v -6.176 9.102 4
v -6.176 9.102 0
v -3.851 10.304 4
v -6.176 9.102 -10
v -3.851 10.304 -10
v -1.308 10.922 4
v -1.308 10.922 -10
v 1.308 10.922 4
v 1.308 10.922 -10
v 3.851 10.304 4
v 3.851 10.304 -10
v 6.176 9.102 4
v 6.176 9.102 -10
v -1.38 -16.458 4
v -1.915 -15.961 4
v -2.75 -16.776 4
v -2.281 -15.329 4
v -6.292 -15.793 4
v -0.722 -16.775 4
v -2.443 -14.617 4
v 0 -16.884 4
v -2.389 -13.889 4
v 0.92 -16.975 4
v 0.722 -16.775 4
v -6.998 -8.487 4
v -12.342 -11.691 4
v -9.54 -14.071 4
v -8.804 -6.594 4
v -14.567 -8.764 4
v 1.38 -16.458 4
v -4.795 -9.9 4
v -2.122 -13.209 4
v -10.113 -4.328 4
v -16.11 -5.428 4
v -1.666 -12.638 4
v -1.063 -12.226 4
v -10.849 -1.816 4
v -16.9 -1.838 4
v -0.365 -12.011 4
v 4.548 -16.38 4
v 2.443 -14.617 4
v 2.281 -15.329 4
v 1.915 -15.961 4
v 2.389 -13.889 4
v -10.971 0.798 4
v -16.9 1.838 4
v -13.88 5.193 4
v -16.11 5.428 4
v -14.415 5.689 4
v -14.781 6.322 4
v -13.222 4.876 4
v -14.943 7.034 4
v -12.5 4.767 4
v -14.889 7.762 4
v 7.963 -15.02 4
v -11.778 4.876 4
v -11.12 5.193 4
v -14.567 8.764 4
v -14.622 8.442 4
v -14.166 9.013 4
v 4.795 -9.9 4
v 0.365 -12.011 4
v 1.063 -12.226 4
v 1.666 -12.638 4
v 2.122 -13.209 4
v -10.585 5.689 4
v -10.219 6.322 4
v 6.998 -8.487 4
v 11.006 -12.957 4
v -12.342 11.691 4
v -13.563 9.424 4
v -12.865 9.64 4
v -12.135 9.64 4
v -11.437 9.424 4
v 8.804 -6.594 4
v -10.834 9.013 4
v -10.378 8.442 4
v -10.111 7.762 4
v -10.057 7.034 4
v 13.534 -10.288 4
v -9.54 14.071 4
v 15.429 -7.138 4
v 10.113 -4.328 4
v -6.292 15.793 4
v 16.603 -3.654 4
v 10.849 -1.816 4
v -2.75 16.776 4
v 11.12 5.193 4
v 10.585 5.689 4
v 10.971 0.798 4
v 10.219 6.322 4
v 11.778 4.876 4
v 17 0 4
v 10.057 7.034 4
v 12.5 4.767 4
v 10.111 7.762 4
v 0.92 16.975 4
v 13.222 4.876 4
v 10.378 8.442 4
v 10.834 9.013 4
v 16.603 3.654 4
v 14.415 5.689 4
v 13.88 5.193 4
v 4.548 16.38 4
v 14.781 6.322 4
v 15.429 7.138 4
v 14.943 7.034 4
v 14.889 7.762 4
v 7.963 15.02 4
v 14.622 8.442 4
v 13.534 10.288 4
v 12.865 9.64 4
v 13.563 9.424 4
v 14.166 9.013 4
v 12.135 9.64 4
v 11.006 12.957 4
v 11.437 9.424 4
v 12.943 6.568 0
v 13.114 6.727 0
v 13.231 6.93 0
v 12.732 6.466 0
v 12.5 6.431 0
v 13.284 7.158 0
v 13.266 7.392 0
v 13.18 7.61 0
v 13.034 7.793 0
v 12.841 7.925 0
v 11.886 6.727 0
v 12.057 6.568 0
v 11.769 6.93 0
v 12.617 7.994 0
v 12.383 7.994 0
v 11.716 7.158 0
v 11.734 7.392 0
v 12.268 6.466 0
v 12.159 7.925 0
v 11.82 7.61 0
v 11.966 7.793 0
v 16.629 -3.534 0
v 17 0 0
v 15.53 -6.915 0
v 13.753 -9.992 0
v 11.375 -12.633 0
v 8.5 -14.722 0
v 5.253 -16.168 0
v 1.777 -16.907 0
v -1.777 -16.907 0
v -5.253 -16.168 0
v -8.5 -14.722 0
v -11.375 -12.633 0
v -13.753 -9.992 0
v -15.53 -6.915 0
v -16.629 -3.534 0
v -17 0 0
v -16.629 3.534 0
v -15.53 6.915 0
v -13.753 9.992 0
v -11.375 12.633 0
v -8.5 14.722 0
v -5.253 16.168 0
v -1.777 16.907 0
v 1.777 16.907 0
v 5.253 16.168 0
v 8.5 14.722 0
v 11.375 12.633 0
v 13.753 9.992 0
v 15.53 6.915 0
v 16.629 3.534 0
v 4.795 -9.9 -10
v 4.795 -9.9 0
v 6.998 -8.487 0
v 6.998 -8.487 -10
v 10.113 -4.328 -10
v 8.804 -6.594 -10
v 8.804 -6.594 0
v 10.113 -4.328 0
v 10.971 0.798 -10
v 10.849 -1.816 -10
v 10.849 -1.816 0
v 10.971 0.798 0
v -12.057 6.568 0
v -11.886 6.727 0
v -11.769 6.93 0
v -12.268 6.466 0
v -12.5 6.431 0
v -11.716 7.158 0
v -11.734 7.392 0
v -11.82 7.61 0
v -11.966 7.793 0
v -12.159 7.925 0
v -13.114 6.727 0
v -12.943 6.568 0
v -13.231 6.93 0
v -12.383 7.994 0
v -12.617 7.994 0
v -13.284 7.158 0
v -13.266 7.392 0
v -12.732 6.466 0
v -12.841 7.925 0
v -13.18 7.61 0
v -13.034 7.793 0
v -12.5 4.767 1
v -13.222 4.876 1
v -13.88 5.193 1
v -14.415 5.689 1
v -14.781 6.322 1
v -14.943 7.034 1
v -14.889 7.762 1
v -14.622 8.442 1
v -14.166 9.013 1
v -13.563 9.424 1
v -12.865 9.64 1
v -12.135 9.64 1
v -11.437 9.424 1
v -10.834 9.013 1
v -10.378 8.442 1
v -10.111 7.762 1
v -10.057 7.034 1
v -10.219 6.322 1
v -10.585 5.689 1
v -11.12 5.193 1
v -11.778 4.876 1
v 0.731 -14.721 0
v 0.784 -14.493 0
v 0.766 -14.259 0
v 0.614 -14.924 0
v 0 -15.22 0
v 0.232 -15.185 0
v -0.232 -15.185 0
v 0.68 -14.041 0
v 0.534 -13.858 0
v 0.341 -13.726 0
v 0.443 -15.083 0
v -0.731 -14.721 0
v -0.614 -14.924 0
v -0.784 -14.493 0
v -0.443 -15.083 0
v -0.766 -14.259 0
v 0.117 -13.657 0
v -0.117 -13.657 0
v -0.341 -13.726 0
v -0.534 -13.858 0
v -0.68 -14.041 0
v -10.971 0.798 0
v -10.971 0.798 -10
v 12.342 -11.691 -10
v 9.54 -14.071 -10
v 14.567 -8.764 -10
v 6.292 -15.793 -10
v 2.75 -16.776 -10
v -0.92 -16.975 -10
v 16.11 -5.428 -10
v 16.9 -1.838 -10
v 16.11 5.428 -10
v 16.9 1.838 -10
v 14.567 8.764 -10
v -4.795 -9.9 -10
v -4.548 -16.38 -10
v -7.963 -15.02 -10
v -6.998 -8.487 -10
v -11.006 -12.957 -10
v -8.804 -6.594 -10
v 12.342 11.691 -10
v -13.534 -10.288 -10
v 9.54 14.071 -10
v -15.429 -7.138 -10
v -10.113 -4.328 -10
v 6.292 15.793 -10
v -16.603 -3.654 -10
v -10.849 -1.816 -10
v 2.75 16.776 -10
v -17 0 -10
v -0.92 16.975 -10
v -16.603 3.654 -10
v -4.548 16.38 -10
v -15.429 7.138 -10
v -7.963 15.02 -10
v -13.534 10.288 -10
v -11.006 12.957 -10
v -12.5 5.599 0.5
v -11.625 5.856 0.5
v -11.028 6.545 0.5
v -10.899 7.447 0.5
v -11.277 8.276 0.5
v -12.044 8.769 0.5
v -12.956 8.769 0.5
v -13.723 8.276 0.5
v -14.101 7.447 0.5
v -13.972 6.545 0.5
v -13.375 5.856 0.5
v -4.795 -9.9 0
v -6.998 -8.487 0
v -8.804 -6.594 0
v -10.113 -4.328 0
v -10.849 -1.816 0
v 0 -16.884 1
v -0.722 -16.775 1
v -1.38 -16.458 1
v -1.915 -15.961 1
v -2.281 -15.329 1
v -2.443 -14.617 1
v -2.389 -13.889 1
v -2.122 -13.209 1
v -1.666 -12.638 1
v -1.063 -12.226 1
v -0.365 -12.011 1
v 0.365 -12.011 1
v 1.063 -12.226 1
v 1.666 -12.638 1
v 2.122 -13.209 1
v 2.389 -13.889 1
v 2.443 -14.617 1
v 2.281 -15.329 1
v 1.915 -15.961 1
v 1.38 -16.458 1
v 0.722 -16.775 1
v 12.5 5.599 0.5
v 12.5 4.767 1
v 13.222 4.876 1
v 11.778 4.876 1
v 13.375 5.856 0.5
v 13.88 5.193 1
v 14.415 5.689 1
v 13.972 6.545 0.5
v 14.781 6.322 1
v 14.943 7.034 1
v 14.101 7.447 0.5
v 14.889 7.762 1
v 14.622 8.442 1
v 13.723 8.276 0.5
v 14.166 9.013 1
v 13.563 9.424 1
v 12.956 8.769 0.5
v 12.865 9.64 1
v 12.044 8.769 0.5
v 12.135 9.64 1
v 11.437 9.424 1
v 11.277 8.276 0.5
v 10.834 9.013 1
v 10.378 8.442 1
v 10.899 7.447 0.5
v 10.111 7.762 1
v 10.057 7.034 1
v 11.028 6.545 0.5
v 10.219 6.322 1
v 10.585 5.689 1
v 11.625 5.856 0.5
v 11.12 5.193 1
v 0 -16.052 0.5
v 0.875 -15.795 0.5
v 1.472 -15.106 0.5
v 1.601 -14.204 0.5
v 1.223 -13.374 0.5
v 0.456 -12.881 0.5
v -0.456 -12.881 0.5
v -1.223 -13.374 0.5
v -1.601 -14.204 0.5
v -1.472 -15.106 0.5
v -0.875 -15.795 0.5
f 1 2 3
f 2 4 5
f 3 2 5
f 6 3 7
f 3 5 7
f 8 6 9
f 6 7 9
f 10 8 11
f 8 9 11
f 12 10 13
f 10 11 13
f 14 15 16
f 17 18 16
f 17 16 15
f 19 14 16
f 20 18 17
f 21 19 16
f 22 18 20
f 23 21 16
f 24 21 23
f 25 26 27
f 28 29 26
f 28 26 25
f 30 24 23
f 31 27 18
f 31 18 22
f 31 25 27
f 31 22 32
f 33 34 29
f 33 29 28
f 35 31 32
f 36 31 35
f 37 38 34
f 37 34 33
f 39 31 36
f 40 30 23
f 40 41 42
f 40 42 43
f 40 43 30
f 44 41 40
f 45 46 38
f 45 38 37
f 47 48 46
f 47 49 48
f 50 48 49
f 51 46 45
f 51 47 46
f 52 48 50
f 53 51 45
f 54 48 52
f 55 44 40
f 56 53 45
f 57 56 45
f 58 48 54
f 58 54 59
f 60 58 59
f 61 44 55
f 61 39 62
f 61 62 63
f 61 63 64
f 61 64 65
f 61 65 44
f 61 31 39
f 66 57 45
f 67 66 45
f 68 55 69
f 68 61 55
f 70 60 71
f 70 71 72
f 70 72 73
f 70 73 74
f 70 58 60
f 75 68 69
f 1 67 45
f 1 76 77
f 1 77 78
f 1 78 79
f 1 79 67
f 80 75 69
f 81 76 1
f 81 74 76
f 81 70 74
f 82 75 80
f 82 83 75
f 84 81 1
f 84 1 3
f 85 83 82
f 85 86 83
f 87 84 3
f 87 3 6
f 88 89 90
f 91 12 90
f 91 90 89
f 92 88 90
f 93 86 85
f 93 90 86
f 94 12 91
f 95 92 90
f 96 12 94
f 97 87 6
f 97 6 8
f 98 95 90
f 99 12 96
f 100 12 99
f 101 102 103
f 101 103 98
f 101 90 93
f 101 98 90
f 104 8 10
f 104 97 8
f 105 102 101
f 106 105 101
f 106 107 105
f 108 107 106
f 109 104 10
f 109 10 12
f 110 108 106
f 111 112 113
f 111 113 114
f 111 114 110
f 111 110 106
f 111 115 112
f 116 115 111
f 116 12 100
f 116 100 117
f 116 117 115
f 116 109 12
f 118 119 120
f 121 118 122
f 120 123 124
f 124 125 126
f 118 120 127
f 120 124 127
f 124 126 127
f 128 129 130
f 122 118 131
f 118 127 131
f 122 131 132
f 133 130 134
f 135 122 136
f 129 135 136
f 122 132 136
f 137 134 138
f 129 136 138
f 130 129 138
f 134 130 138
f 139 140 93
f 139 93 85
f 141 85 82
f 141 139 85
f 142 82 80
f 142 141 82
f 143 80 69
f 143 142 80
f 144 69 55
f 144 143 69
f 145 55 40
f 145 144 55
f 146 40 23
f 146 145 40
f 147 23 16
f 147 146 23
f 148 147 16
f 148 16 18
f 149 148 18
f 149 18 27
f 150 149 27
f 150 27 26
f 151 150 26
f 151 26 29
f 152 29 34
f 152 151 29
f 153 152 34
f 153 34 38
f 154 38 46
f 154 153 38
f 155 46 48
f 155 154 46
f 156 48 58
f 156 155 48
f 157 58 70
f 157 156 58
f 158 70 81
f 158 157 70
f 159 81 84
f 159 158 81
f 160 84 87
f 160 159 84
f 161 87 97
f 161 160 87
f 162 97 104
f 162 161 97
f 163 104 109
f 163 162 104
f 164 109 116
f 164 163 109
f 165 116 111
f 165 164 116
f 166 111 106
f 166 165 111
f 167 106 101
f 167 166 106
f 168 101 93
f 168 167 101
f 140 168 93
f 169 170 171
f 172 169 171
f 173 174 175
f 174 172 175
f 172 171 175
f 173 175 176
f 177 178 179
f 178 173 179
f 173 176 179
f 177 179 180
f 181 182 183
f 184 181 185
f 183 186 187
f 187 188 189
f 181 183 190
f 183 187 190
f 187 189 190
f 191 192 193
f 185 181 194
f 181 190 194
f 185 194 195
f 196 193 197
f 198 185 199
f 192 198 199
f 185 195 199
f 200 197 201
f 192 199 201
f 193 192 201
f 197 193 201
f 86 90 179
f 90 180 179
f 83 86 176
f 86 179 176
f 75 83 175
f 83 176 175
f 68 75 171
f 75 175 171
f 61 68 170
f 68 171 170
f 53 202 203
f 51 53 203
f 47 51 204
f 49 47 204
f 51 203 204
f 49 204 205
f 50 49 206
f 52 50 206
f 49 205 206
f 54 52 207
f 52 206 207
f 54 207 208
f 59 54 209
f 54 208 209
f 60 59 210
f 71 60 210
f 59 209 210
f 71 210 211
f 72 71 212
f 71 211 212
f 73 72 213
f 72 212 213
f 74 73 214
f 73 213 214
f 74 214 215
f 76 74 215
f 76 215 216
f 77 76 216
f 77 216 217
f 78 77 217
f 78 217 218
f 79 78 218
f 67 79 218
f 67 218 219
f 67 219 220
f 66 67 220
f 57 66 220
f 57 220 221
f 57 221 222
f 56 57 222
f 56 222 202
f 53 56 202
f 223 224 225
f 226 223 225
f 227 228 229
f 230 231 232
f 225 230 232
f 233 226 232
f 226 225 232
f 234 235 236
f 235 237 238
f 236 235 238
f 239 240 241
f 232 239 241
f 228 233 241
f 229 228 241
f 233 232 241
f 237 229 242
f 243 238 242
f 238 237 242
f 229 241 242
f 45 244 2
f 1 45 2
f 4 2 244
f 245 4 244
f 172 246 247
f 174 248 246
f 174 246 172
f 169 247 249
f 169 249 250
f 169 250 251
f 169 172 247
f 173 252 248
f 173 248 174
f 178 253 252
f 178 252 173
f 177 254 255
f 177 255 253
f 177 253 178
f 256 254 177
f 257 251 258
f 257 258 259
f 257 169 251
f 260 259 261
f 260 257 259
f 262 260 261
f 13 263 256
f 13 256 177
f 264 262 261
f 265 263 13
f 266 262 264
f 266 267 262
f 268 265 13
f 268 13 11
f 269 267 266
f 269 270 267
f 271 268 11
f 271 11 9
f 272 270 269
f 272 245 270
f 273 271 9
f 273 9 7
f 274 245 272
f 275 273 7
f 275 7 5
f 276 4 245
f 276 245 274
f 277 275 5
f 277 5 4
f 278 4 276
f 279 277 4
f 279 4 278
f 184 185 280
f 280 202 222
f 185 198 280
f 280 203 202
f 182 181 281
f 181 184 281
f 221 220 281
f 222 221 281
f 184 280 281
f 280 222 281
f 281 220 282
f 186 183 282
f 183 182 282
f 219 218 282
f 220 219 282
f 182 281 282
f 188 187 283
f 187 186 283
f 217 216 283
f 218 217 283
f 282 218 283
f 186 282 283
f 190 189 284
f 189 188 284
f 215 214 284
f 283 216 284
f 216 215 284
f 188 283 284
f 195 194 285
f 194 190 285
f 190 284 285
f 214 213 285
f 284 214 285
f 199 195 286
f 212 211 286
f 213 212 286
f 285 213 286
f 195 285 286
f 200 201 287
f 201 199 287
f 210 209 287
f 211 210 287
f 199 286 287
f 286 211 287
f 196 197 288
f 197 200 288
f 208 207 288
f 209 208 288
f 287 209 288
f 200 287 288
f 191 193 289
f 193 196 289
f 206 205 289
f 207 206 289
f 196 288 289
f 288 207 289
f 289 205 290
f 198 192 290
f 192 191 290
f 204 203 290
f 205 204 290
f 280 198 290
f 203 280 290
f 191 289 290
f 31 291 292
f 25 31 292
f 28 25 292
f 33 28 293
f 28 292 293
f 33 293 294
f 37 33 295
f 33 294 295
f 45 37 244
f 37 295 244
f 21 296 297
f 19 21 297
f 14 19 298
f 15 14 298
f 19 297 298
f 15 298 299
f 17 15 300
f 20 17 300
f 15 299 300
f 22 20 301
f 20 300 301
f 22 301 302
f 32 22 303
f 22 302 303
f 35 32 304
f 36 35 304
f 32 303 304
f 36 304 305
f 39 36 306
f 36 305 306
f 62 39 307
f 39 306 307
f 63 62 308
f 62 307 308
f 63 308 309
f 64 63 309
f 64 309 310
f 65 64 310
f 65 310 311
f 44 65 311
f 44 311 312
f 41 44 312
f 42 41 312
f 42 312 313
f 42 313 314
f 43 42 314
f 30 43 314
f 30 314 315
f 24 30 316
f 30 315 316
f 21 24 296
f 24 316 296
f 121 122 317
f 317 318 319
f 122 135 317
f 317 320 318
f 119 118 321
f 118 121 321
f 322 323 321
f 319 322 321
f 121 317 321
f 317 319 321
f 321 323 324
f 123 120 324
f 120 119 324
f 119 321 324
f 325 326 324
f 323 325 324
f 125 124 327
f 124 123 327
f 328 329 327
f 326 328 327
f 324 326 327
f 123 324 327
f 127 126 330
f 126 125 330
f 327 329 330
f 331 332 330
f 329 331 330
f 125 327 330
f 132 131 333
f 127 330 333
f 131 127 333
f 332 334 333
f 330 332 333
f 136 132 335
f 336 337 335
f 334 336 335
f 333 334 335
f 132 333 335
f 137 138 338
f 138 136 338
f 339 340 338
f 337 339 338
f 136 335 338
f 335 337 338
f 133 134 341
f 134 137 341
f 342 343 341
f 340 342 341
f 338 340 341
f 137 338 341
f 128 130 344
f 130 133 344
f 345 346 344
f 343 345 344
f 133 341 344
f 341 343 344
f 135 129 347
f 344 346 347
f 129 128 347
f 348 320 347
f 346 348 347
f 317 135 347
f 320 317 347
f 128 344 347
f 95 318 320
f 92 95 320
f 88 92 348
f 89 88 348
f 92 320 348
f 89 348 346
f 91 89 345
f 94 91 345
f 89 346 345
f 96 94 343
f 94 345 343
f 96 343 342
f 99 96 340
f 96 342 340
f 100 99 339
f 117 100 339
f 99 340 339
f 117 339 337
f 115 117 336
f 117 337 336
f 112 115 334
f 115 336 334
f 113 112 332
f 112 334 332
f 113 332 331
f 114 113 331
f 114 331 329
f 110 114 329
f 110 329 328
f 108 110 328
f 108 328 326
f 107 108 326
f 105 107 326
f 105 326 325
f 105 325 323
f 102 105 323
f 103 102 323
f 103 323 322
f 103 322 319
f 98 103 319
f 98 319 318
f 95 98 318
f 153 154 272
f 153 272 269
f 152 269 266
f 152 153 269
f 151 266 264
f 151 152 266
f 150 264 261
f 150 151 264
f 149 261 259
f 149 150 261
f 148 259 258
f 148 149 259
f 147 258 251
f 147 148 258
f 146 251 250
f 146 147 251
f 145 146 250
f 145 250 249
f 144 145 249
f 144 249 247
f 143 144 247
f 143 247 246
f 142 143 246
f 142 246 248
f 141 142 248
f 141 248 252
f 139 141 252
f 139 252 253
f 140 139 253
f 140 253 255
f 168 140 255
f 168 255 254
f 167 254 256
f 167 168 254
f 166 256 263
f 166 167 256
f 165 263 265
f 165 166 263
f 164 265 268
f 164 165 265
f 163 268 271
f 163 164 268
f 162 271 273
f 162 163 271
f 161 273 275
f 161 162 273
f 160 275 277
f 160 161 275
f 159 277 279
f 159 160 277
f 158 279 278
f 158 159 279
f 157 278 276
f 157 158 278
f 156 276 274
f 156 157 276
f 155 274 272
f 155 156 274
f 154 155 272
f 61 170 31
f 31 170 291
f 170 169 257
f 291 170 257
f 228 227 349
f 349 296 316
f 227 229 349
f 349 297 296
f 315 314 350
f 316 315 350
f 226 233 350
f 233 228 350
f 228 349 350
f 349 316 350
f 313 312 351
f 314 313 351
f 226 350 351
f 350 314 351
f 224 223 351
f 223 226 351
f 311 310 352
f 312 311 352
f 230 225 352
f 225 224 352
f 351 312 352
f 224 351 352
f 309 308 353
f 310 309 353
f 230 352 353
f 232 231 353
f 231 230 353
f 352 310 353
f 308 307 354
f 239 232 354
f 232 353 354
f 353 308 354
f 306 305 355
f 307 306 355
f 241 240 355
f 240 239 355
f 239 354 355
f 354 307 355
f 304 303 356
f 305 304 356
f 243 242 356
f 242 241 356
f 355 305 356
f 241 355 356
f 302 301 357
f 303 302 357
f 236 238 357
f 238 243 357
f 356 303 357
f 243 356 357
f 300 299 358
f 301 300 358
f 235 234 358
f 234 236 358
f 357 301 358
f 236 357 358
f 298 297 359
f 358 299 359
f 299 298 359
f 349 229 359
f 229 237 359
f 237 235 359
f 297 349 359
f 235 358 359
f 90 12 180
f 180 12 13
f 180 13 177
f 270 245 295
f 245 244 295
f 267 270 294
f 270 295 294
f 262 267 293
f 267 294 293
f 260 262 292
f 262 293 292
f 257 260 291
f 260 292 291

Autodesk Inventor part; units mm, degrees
ref_plane "YZ Plane" through (0, 0, 0) normal (1, 0, 0) x (0, 1, 0)
ref_plane "XZ Plane" through (0, 0, 0) normal (0, 1, 0) x (-1, 0, 0)
ref_plane "XY Plane" through (0, 0, 0) normal (0, 0, 1) x (1, 0, 0)
sketch "Sketch1" plane through (0, 0, 0) normal (0, 0, 1) x (1, 0, 0)
  circle A0 centre (0, 0) radius 17
  line L0 (4.7948, -9.9) -> (-4.7948, -9.9)
  line L1 (-23.8, 0) -> (23.8, 0) projected
  line L2 (6.1763, 9.1024) -> (10.971, 0.7976)
  line L3 (-10.971, 0.7976) -> (-6.1763, 9.1024)
  arc A1 (4.7948, -9.9) -> (10.971, 0.7976) centre (0, 0) ccw
  arc A2 (6.1763, 9.1024) -> (-6.1763, 9.1024) centre (0, 0) ccw
  arc A3 (-10.971, 0.7976) -> (-4.7948, -9.9) centre (0, 0) ccw
  dimension "d1" = 34
  dimension "d2" = 9.9
  dimension "d5" = 360
  dimension "d18" = 11
extrude "Extrusion1" add sketch "Sketch1" along normal blind 4 contours L1 A1 L2 A2 L3 A3 A0 | A0 L1 A3 L0 A1
sketch "Sketch3" plane through (0, 0, 4) normal (0, 0, 1) x (1, 0, 0)
  arc A0 (-12.5839, 8.6144) -> (-13.7522, 6.5908) centre (-12.5, 7.2169) ccw projected
  arc A1 (12.9288, 8.5496) -> (13.8686, 6.9219) centre (12.5, 7.2169) ccw projected
  arc A2 (0.9397, -15.4715) -> (-0.9397, -15.4715) centre (0, -14.4338) ccw projected
  point P0 (0, 0)
hole "Hole1" at (12.5, 7.2169, 4) at (0, -14.4338, 4) at (-12.5, 7.2169, 4) direction (0, 0, -1) diameter 4.9 depth 3 tip angle 118
sketch "Sketch4" plane through (0, 0, 0) normal (0, 0, -1) x (-1, 0, 0)
  circle A0 centre (0, -14.4338) radius 0.7857 projected
  circle A1 centre (-12.5, 7.2169) radius 0.7857 projected
  circle A2 centre (12.5, 7.2169) radius 0.7857 projected
  arc A3 (4.7948, -9.9) -> (10.971, 0.7976) centre (0, 0) ccw projected
  line L0 (4.7948, -9.9) -> (-4.7948, -9.9) projected
  arc A4 (-10.971, 0.7976) -> (-4.7948, -9.9) centre (0, 0) ccw projected
  line L1 (-10.971, 0.7976) -> (-6.1763, 9.1024) projected
  arc A5 (6.1763, 9.1024) -> (-6.1763, 9.1024) centre (0, 0) ccw projected
  line L2 (6.1763, 9.1024) -> (10.971, 0.7976) projected
  circle A6 centre (0, 0) radius 17 projected
extrude "Extrusion2" add sketch "Sketch4" along normal blind 10 contours A0 | A1 | A2 | A6
properties part number "cellSTORM_magnetic_RMS_adapter"
